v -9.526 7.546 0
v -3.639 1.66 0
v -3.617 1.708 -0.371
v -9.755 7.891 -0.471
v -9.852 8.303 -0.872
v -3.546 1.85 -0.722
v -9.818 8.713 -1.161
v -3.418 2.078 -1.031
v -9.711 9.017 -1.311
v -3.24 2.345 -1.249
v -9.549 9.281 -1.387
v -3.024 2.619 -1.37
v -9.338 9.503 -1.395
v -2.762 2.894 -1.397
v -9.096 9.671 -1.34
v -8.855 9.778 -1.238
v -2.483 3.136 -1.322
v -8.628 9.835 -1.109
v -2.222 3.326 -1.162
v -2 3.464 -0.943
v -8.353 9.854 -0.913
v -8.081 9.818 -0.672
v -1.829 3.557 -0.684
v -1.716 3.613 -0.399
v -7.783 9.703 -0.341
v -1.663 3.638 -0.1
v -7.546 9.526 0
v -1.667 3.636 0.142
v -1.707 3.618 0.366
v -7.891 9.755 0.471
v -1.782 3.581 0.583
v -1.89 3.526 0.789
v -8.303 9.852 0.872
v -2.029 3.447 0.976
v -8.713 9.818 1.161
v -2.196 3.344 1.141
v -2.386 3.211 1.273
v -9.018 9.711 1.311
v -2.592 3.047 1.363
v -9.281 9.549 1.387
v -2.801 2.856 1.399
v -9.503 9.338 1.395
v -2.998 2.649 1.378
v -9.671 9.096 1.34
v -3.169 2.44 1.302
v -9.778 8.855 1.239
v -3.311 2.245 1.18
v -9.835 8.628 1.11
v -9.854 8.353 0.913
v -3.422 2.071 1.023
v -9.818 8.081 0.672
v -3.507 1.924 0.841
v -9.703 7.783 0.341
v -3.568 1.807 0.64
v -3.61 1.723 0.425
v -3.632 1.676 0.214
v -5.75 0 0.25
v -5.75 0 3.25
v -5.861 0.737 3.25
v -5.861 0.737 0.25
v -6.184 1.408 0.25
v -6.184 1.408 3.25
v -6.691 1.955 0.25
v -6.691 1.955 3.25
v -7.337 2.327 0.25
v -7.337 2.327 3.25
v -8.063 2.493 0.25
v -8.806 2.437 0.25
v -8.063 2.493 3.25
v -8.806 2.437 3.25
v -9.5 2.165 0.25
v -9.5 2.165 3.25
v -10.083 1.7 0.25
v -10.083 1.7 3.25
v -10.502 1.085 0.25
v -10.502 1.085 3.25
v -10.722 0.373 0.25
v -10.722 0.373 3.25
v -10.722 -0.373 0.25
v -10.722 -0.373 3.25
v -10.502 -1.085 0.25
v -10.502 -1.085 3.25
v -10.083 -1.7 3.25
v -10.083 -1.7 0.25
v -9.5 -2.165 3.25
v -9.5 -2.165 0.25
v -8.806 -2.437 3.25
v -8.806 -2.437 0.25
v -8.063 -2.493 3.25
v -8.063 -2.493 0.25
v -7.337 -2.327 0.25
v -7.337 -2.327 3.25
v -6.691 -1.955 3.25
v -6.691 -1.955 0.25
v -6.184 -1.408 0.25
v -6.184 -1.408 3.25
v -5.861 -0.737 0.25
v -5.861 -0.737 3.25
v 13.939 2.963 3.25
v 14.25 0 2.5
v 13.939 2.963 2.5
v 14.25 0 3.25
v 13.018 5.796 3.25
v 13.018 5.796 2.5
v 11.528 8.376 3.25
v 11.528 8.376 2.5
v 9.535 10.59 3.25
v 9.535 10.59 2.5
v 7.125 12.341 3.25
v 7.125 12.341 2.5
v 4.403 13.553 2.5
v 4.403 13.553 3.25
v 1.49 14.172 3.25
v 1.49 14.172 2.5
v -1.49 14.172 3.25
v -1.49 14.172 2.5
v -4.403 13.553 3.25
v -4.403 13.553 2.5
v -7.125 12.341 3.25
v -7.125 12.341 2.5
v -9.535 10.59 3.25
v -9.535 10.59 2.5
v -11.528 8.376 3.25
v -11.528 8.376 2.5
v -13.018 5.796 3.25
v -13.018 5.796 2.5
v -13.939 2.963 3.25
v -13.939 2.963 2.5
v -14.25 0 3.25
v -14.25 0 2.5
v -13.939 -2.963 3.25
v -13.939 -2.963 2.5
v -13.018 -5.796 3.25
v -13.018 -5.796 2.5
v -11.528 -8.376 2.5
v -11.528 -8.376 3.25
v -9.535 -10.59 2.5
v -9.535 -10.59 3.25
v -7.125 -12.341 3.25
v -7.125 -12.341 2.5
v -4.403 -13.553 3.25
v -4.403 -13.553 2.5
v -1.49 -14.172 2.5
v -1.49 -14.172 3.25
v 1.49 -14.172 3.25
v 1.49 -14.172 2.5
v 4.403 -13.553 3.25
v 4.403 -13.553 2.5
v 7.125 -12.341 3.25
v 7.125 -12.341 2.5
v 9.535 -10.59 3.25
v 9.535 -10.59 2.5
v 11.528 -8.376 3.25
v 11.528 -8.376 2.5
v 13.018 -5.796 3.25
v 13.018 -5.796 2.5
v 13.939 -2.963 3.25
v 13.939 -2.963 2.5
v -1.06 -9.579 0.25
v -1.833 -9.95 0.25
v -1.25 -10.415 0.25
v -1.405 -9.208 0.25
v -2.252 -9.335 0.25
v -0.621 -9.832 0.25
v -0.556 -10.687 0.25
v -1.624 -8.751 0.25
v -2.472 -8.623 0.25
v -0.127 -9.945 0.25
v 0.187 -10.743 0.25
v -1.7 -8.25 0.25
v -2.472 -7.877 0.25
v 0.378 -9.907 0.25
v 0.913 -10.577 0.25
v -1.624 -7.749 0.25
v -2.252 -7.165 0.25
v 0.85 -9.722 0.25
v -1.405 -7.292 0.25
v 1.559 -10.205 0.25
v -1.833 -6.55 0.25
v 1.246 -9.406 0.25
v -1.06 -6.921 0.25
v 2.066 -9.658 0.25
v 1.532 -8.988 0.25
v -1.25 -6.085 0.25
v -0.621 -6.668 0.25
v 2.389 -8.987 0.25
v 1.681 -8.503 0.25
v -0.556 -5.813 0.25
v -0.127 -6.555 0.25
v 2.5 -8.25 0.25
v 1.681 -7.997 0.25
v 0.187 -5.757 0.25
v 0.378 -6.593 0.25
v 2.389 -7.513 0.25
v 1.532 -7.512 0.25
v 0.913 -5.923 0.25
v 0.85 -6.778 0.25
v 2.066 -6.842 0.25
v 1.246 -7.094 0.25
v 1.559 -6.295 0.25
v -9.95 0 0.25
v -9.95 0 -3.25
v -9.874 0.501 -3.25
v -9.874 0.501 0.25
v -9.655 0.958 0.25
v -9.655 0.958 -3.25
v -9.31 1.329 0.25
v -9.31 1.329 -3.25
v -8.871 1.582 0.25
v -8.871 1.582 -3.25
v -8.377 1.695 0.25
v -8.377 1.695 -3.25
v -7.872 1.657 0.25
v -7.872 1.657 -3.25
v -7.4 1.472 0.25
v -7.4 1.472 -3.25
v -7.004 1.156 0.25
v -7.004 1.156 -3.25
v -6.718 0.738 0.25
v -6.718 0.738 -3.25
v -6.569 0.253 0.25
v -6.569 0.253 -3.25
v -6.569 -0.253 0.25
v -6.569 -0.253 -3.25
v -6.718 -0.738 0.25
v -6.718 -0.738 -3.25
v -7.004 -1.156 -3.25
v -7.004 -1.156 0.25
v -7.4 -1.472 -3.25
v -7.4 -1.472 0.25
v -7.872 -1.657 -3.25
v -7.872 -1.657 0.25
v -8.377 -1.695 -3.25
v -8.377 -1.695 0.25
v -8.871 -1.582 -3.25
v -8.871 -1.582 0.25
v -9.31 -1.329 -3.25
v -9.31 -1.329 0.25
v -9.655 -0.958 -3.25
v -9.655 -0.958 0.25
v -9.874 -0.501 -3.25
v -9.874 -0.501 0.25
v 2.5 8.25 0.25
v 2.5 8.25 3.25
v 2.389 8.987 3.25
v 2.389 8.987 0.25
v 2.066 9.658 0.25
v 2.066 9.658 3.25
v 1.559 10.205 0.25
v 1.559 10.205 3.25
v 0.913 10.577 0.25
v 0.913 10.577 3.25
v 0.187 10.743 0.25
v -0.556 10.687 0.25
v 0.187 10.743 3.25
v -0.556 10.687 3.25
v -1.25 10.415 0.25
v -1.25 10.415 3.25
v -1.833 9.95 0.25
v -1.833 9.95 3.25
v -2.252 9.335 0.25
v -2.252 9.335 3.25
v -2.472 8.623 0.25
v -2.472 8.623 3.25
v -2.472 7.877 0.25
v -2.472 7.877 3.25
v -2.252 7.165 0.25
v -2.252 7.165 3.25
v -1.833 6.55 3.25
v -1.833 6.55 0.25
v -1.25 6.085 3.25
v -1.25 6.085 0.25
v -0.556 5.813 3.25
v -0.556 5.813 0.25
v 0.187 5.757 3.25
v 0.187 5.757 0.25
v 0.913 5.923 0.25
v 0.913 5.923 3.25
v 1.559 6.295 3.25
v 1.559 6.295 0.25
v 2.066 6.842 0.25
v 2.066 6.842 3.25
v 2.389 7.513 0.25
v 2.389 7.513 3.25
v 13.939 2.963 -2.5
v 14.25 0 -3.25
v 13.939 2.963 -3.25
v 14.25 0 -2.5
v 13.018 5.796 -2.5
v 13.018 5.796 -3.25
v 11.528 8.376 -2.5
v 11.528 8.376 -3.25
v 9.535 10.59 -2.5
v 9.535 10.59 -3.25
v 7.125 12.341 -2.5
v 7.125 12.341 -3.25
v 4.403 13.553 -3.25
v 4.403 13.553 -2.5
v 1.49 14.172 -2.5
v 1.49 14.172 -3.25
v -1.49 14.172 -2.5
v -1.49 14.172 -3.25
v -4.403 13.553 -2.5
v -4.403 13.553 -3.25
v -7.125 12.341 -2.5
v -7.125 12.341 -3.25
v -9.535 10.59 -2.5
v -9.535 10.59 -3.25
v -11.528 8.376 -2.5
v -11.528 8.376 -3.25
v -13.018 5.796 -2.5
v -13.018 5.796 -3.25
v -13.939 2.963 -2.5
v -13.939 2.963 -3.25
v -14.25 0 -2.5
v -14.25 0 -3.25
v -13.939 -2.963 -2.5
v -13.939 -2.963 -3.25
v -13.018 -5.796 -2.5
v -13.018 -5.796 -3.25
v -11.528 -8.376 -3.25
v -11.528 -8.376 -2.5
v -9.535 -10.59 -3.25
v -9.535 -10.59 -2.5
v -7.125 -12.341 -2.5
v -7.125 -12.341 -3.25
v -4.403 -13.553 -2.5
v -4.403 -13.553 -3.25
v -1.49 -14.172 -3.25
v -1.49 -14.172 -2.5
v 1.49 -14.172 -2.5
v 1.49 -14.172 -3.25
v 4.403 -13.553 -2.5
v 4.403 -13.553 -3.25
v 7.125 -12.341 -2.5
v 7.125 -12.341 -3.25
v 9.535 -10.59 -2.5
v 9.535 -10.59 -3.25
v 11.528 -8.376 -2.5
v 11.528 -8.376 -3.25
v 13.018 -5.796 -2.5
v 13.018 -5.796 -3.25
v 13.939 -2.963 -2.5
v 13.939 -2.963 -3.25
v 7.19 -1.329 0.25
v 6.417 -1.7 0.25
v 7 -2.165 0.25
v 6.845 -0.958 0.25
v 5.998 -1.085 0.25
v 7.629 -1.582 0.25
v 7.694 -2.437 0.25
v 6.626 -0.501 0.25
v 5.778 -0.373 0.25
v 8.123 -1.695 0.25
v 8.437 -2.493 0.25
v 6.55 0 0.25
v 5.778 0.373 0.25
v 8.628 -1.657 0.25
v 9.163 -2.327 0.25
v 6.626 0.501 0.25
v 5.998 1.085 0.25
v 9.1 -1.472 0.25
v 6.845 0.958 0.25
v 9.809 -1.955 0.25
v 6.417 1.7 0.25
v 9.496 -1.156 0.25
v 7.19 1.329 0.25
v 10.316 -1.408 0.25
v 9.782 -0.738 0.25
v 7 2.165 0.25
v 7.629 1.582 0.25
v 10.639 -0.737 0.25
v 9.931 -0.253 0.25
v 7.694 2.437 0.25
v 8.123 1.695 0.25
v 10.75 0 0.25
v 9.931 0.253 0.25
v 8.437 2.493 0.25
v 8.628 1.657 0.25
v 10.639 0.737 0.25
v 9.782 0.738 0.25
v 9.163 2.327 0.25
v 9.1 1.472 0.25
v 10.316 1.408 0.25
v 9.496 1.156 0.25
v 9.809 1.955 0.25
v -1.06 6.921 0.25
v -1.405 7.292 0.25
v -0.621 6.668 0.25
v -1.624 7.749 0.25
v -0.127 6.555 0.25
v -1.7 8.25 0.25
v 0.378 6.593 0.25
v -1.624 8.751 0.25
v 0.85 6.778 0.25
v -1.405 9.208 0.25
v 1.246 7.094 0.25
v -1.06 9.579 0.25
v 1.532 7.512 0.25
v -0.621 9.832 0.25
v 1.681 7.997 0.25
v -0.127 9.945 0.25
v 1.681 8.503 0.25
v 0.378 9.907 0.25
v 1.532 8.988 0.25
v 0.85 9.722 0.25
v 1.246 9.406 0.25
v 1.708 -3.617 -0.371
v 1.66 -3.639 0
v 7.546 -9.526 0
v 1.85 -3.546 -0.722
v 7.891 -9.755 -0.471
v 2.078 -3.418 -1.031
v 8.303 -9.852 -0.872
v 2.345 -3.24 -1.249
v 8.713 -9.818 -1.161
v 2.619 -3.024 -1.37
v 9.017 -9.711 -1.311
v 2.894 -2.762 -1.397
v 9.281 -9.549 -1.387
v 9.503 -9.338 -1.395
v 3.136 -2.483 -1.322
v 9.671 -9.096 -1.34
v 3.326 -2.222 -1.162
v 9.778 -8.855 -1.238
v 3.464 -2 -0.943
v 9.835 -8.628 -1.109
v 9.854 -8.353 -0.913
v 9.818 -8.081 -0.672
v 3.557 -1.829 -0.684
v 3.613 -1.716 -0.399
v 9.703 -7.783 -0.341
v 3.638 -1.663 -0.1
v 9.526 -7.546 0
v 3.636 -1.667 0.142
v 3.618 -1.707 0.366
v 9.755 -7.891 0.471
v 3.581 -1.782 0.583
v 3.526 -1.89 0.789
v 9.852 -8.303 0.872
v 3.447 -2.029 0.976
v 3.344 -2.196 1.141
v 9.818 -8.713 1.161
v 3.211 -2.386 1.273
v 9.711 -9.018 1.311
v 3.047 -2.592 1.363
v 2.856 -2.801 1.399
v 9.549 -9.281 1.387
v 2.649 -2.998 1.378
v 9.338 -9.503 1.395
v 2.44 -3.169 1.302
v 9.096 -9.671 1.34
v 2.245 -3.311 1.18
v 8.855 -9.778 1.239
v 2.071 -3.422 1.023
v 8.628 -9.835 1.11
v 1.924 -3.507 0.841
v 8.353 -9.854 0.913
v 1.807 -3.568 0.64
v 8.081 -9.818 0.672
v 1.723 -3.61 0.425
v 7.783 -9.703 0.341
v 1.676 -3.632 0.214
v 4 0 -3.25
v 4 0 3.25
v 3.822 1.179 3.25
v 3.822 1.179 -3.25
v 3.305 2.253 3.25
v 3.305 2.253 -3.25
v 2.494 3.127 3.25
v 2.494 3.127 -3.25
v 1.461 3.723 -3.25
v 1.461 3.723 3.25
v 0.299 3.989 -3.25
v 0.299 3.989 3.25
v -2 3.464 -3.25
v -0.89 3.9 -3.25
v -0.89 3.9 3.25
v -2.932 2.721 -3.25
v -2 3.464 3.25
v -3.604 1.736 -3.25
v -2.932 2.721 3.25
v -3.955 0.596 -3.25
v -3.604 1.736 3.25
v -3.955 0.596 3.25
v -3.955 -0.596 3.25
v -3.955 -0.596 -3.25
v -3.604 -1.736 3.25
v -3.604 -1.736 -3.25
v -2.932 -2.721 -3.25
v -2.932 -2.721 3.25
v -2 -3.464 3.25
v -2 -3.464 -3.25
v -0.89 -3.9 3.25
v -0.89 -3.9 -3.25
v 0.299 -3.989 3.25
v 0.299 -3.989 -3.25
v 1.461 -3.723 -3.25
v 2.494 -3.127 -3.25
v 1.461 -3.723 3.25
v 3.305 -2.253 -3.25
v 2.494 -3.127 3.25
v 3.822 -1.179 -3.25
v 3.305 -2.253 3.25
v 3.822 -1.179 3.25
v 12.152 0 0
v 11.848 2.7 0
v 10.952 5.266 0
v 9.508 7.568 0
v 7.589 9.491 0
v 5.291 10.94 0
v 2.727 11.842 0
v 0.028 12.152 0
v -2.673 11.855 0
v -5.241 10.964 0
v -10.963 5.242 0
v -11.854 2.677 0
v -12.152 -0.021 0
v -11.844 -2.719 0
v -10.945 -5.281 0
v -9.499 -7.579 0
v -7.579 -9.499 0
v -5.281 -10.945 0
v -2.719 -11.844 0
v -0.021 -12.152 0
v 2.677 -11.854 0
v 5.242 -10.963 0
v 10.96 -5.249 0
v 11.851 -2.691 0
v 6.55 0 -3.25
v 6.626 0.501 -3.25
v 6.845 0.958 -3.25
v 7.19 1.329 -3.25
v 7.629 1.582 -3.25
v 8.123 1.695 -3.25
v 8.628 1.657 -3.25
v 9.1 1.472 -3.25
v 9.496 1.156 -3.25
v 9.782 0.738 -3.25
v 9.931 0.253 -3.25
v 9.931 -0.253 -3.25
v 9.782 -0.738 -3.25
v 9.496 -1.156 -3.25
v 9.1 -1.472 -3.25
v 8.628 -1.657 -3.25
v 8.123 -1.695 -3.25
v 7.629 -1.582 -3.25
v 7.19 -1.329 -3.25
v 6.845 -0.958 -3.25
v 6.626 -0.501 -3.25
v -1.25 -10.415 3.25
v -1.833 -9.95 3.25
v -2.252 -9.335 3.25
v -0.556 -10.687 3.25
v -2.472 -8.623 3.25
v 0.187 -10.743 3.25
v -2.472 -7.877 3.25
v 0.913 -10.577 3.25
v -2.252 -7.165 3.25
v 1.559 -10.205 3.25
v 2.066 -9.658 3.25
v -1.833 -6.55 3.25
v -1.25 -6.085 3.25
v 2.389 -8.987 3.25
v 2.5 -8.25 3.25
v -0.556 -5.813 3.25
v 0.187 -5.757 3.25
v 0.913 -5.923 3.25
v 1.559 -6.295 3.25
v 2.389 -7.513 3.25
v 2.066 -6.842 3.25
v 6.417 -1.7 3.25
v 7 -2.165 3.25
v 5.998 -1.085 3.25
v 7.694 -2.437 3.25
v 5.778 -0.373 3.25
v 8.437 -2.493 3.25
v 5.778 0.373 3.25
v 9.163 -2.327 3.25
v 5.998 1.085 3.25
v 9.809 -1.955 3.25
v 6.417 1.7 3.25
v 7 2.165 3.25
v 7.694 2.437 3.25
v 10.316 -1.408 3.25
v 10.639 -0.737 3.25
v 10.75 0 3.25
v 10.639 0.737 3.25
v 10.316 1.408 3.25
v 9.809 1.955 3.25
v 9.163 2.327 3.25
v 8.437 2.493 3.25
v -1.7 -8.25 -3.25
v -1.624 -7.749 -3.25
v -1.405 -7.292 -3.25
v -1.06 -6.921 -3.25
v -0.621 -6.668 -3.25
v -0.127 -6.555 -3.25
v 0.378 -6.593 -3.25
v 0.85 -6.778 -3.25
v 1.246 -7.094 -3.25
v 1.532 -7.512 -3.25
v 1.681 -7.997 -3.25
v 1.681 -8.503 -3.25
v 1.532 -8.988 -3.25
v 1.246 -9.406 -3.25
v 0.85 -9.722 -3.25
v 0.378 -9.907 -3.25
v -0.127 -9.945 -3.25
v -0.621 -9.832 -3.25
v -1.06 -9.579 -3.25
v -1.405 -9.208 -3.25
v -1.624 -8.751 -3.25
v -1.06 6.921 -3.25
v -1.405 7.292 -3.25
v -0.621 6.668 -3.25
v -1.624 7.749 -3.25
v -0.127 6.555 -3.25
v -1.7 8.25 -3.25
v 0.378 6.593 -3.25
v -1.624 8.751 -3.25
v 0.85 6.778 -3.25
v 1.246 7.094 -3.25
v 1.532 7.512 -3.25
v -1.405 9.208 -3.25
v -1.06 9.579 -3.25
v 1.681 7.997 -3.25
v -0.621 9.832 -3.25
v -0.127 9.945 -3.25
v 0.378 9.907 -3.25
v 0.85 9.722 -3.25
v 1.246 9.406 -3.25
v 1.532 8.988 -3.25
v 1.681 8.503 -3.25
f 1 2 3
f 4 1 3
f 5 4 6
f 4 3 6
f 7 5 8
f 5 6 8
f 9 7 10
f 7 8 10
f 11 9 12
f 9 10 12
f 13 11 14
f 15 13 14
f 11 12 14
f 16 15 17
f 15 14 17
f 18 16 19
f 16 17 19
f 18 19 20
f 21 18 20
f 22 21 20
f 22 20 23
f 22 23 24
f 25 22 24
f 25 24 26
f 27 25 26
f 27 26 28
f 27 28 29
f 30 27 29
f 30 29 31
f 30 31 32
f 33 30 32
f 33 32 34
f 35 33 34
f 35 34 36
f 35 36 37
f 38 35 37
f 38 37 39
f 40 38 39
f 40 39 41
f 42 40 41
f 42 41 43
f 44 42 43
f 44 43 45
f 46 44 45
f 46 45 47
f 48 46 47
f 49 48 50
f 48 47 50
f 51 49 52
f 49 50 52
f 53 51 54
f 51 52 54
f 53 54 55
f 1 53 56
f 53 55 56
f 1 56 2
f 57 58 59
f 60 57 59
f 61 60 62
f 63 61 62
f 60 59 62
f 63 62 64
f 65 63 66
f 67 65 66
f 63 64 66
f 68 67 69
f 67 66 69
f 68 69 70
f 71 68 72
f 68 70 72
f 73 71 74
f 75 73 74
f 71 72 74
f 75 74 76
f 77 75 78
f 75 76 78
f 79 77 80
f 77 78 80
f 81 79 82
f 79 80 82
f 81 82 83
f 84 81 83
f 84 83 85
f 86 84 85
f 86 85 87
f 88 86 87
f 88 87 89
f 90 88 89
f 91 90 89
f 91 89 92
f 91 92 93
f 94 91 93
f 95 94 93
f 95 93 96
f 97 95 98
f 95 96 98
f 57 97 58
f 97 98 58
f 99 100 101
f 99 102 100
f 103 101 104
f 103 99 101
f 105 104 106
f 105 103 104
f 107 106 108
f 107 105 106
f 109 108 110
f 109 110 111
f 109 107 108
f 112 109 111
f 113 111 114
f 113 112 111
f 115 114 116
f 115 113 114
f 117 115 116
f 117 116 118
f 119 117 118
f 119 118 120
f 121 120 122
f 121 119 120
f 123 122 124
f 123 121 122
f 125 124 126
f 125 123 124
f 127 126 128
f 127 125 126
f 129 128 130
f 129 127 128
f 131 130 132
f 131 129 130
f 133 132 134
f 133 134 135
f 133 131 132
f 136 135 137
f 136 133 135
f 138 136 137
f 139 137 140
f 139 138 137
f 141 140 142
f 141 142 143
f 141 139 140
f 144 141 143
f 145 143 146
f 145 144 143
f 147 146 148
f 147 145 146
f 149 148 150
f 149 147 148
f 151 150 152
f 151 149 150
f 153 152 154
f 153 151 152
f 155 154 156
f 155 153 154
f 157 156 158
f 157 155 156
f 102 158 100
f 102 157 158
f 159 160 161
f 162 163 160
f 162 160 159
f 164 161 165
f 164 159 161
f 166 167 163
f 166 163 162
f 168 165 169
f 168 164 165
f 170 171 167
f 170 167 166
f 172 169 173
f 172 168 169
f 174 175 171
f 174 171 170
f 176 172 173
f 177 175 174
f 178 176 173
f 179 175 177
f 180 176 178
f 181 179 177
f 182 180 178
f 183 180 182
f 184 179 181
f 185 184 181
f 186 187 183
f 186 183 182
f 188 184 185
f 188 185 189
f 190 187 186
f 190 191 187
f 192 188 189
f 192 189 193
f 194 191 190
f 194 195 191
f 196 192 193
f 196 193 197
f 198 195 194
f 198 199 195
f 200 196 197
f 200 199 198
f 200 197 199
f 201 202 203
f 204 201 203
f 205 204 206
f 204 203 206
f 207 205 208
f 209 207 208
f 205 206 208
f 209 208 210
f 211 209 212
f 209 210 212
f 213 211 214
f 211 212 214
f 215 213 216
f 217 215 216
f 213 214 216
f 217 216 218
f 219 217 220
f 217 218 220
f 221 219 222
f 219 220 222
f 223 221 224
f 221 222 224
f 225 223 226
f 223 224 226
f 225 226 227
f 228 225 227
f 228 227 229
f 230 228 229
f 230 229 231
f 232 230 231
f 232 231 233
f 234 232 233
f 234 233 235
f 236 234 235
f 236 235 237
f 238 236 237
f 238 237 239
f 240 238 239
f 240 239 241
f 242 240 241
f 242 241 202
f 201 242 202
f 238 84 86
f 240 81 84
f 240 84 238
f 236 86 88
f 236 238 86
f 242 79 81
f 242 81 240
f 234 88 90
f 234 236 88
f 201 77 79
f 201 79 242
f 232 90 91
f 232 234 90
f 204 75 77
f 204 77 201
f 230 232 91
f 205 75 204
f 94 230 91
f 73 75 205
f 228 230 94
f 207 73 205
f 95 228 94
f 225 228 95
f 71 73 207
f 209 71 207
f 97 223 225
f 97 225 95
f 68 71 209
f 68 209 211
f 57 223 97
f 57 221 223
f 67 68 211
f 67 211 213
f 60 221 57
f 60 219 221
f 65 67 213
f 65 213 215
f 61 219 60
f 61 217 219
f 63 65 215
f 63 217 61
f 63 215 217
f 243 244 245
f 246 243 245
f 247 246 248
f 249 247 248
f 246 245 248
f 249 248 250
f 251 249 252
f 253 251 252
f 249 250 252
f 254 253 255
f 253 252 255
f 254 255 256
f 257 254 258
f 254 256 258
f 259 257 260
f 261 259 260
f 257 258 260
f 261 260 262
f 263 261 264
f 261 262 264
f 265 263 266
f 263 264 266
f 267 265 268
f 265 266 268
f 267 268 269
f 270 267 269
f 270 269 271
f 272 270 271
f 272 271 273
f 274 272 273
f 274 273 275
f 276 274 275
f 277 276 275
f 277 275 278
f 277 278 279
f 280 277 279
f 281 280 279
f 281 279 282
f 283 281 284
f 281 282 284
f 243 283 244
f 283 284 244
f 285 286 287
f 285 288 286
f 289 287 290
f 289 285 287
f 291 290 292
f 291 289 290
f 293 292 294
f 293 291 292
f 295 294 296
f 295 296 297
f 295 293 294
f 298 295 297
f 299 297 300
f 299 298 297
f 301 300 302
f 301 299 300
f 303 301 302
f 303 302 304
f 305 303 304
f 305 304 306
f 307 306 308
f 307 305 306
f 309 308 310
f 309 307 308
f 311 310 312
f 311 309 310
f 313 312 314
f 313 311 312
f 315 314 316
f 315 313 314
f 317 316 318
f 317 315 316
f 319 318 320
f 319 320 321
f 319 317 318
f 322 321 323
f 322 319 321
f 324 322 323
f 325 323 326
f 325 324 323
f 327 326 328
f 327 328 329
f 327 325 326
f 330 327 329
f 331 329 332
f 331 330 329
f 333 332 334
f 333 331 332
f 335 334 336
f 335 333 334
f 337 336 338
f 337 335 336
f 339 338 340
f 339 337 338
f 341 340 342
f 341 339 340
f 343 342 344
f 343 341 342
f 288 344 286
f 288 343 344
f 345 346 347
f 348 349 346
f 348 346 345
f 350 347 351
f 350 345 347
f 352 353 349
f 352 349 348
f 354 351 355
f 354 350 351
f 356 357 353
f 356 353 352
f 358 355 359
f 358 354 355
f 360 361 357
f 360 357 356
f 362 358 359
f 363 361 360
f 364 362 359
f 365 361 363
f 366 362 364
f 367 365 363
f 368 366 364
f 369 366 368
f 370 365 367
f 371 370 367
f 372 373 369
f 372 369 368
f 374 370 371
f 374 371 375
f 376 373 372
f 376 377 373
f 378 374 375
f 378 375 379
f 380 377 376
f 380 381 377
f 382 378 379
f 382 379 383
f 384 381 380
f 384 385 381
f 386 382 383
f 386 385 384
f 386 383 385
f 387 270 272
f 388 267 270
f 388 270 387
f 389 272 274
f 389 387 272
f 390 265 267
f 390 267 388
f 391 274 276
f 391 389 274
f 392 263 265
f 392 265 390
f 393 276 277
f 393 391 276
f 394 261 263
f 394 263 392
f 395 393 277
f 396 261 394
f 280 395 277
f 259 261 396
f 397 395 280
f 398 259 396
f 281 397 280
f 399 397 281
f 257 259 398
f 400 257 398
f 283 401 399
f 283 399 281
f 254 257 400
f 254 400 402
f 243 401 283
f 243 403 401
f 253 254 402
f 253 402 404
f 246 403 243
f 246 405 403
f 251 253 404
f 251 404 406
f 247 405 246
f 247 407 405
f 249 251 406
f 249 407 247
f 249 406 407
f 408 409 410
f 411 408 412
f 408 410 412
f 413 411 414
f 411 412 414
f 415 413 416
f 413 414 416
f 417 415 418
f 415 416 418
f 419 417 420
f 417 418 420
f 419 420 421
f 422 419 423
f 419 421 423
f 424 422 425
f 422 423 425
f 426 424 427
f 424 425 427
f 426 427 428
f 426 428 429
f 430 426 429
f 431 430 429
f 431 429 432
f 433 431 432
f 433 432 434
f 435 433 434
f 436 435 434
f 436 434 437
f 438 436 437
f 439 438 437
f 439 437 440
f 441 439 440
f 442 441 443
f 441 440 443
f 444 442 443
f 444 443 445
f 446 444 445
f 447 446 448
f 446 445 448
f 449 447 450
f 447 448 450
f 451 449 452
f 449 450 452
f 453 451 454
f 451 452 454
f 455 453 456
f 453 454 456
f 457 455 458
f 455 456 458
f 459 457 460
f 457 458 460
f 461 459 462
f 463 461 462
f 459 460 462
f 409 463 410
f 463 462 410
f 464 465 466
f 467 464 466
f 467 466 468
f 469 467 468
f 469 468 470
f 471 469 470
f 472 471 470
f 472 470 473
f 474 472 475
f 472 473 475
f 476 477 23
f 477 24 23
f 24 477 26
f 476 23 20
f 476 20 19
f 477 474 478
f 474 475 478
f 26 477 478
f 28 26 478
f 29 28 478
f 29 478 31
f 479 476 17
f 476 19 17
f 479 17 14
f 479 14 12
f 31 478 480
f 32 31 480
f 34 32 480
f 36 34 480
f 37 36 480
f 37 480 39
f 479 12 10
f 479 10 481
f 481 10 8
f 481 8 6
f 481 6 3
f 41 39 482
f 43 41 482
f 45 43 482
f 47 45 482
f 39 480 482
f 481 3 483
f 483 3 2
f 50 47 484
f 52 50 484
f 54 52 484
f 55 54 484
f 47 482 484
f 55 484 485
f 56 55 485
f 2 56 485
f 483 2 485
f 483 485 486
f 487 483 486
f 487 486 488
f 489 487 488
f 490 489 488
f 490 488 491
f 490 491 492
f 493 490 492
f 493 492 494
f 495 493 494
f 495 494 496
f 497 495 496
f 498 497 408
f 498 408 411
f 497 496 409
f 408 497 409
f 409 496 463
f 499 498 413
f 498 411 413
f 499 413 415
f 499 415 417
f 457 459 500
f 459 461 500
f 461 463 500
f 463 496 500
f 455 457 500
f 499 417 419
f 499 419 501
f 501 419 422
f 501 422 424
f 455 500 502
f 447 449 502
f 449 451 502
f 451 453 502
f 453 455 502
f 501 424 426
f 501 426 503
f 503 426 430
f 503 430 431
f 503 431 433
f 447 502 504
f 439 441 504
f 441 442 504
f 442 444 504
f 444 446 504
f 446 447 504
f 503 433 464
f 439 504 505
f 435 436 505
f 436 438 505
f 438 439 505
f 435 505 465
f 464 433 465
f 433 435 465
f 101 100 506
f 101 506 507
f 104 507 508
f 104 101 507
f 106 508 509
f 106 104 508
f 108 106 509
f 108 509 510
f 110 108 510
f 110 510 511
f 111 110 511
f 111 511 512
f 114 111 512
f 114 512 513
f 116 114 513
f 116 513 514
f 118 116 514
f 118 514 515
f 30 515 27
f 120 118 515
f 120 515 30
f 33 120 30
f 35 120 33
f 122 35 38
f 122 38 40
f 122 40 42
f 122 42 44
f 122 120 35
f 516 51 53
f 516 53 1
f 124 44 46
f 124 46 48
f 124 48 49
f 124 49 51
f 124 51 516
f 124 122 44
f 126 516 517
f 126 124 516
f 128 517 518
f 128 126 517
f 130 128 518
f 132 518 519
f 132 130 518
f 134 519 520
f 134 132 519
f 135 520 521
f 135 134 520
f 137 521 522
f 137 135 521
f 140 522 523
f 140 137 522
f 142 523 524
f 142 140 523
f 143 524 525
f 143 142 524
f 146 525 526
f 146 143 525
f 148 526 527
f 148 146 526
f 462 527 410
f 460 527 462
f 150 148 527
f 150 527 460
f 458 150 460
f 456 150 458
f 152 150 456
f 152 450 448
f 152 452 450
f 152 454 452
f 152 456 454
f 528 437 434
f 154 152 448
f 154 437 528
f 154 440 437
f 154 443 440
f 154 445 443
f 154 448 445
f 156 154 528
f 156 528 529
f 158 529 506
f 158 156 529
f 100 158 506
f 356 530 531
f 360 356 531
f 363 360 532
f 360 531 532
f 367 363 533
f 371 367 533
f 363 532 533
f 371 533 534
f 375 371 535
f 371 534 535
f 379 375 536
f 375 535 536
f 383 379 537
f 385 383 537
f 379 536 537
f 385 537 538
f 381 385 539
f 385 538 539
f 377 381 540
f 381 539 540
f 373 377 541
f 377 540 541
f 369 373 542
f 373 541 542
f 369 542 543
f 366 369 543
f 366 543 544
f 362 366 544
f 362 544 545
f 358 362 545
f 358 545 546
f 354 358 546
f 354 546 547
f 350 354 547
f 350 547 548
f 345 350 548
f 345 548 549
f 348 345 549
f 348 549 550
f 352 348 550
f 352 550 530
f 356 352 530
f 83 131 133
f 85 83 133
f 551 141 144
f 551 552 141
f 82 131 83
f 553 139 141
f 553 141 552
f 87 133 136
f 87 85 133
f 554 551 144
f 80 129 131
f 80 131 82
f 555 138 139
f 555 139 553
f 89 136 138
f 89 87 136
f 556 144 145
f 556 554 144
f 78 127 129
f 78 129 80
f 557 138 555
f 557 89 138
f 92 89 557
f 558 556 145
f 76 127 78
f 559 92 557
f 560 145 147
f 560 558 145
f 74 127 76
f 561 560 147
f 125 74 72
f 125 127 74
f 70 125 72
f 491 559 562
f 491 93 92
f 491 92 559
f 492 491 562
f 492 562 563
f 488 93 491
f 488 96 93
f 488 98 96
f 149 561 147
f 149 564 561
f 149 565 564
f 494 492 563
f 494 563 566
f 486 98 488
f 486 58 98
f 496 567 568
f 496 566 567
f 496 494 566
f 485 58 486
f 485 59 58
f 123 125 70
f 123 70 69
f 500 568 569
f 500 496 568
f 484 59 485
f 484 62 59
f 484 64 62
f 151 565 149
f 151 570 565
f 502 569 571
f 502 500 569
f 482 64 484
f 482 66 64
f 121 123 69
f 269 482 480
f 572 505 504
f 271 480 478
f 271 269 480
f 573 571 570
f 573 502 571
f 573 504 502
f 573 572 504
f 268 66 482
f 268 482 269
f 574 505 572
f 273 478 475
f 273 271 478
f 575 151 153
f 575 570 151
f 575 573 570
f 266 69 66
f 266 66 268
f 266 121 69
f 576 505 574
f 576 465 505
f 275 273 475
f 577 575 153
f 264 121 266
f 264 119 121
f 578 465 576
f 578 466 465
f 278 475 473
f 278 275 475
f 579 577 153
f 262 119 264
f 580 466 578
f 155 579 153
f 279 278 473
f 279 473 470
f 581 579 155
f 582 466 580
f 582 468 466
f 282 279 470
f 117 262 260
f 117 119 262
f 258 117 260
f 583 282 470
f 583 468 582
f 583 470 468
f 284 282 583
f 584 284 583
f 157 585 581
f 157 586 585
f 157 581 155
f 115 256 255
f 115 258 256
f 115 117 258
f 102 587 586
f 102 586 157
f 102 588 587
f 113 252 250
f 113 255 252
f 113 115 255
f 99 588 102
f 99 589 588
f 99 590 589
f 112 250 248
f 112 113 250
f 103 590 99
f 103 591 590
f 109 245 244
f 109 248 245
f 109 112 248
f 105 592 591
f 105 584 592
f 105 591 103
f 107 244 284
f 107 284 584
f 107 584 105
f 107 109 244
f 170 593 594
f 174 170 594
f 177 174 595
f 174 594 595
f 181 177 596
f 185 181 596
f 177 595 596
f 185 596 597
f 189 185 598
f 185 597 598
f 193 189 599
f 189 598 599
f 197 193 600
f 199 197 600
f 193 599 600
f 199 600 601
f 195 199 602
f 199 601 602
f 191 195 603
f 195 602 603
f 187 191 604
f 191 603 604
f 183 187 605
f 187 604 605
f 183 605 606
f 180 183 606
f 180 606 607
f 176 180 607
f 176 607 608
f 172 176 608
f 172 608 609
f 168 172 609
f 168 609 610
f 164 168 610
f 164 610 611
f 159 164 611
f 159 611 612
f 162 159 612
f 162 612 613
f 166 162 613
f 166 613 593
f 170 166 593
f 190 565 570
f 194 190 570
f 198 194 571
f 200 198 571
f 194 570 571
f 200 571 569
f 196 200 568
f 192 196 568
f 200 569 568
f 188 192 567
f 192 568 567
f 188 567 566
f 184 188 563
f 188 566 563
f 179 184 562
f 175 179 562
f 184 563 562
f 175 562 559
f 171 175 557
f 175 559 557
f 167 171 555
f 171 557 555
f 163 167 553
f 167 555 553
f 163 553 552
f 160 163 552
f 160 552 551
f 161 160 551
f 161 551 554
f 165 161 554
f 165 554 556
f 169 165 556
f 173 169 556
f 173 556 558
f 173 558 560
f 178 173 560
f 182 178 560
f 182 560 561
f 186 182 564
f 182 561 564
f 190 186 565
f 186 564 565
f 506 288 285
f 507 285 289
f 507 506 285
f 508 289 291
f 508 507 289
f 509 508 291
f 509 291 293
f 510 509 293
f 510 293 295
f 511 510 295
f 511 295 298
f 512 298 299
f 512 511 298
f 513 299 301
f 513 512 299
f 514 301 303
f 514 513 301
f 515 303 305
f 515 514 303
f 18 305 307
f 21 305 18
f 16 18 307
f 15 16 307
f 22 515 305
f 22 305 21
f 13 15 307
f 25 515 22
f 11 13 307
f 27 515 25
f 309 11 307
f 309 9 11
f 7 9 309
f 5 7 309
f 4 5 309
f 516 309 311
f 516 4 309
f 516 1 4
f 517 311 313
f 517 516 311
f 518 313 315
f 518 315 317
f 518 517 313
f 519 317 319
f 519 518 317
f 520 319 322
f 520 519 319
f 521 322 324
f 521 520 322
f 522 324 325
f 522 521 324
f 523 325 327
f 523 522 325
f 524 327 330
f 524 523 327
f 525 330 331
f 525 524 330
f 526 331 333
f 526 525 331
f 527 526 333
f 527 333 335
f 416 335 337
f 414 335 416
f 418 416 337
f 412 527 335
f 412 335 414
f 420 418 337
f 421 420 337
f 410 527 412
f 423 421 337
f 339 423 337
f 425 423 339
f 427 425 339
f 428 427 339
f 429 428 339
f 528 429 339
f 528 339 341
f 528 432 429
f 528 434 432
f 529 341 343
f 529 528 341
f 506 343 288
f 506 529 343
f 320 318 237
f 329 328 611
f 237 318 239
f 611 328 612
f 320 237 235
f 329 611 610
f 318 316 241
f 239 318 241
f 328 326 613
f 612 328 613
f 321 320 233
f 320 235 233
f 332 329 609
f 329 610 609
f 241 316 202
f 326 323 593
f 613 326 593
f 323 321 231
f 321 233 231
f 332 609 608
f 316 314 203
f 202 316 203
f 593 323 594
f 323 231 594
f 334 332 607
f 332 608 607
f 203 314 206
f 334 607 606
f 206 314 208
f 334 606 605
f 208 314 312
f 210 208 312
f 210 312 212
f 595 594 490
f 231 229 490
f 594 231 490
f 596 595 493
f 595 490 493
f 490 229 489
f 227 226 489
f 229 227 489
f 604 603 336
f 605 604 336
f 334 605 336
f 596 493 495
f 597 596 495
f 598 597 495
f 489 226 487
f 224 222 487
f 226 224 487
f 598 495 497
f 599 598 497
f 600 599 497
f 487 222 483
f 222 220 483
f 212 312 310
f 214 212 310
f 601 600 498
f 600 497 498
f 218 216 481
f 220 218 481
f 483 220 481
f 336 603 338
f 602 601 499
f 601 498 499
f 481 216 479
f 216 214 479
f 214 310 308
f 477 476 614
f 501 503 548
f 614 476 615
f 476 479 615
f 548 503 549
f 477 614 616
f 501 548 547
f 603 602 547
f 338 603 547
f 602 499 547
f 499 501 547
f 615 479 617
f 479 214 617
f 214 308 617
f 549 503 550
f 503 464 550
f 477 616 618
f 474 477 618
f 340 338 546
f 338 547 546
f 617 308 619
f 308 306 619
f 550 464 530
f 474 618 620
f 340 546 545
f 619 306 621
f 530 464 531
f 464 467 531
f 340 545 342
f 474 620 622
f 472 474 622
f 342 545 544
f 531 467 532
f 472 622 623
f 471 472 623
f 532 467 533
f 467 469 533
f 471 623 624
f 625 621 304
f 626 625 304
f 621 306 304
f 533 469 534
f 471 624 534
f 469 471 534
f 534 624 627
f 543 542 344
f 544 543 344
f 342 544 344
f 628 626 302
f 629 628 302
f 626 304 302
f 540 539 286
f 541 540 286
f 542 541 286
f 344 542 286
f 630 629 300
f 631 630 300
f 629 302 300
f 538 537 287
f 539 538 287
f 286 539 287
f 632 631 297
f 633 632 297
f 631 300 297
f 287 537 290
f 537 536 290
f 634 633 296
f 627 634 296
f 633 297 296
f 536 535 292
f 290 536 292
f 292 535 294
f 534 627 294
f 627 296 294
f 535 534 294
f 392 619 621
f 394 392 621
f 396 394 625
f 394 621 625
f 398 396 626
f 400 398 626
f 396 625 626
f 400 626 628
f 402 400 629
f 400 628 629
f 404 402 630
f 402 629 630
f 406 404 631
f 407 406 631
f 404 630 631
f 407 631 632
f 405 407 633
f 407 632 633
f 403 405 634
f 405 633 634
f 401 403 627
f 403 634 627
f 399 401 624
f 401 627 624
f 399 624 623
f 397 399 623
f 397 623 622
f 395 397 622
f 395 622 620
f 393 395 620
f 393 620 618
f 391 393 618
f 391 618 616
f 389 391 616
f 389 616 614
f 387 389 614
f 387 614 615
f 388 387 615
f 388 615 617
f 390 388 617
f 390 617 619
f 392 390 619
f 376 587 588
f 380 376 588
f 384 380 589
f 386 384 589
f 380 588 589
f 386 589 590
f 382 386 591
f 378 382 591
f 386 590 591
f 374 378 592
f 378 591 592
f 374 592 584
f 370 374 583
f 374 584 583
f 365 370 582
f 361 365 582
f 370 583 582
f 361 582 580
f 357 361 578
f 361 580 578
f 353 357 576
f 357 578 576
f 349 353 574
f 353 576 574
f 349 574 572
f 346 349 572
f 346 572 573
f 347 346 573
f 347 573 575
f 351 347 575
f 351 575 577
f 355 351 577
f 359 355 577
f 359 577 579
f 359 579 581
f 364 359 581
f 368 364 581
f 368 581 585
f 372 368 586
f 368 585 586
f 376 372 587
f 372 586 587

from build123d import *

# Parameters (mm, degrees)
ESQUISSE2_R                  = 14.25
BOSS_EXTRU_1_DEPTH           = 3.25
ESQUISSE3_R                  = 1.2
ENL_V_MAT_EXTRU_1_DEPTH      = 4.25
ESQUISSE10_R                 = 1.7
ENL_V_MAT_EXTRU_2_DEPTH      = 1
ENL_V_MAT_EXTRU_2_DEPTH_BACK = 7.5
ESQUISSE17_R                 = 4
ENL_V_MAT_EXTRU_8_DEPTH      = 7.5
ESQUISSE13_R                 = 1.4
ENL_V_MAT_EXTRU_4_DEPTH      = 35.402543264
ESQUISSE20_R                 = 2.5
ENL_V_MAT_EXTRU_9_DEPTH      = 3


with BuildPart() as part:
    # Esquisse2 → Boss.-Extru.1 (new body, symmetric)
    with BuildSketch(Plane.XY):
        Circle(ESQUISSE2_R)
    extrude(amount=BOSS_EXTRU_1_DEPTH, both=True)

    # Esquisse3 → Enlèv. mat.-Extru.1 (cut, through all)
    with BuildSketch(Plane.XY):
        with Locations((0, 8.25)):
            Circle(ESQUISSE3_R)
        with Locations((-8.25, 0)):
            Circle(ESQUISSE3_R)
        with Locations((0, -8.25)):
            Circle(ESQUISSE3_R)
        with Locations((8.25, 0)):
            Circle(ESQUISSE3_R)
    extrude(amount=ENL_V_MAT_EXTRU_1_DEPTH, mode=Mode.SUBTRACT)

    # Esquisse10 → Enlèv. mat.-Extru.2 (cut, two sides)
    with BuildSketch(Plane(origin=(0, 0, -3.25), x_dir=(-1, 0, 0), z_dir=(0, 0, -1))) as enl_v_mat_extru_2_sk:
        with Locations((-8.25, 0)):
            Circle(ESQUISSE10_R)
        with Locations((0, 8.25)):
            Circle(ESQUISSE10_R)
        with Locations((8.25, 0)):
            Circle(ESQUISSE10_R)
        with Locations((0, -8.25)):
            Circle(ESQUISSE10_R)
    extrude(amount=ENL_V_MAT_EXTRU_2_DEPTH, mode=Mode.SUBTRACT)
    extrude(enl_v_mat_extru_2_sk.sketch, amount=-ENL_V_MAT_EXTRU_2_DEPTH_BACK, mode=Mode.SUBTRACT)

    # Esquisse17 → Enlèv. mat.-Extru.8 (cut, through all)
    with BuildSketch(Plane.XY.offset(3.25)):
        Circle(ESQUISSE17_R)
    extrude(amount=-ENL_V_MAT_EXTRU_8_DEPTH, mode=Mode.SUBTRACT)

    # Esquisse13 → Enlèv. mat.-Extru.4 (cut, through all)
    with BuildSketch(Plane(origin=(10.076271632, -10.076271632, 0), x_dir=(-0.707106781, -0.707106781, 0), z_dir=(0.707106781, -0.707106781, 0))):
        Circle(ESQUISSE13_R)
    extrude(amount=-ENL_V_MAT_EXTRU_4_DEPTH, mode=Mode.SUBTRACT)

    # Esquisse18 → Enlèvement de matière-Révolution1 (revolve, cut)
    with BuildSketch(Plane(origin=(0, 0, 0), x_dir=(1, 0, 0), z_dir=(0, 1, 0))):
        Polygon((14.25, 2.5), (12.152250922, 0), (14.25, -2.5), align=None)
    revolve(axis=Axis((0, 0, -3.25), (0, 0, 1)), mode=Mode.SUBTRACT)

    # Esquisse20 → Enlèv. mat.-Extru.9 (cut)
    with BuildSketch(Plane.XY.offset(3.25)):
        with Locations((0, 8.25)):
            Circle(ESQUISSE20_R)
        with Locations((8.25, 0)):
            Circle(ESQUISSE20_R)
        with Locations((-8.25, 0)):
            Circle(ESQUISSE20_R)
        with Locations((0, -8.25)):
            Circle(ESQUISSE20_R)
    extrude(amount=-ENL_V_MAT_EXTRU_9_DEPTH, mode=Mode.SUBTRACT)


solid = part.part
